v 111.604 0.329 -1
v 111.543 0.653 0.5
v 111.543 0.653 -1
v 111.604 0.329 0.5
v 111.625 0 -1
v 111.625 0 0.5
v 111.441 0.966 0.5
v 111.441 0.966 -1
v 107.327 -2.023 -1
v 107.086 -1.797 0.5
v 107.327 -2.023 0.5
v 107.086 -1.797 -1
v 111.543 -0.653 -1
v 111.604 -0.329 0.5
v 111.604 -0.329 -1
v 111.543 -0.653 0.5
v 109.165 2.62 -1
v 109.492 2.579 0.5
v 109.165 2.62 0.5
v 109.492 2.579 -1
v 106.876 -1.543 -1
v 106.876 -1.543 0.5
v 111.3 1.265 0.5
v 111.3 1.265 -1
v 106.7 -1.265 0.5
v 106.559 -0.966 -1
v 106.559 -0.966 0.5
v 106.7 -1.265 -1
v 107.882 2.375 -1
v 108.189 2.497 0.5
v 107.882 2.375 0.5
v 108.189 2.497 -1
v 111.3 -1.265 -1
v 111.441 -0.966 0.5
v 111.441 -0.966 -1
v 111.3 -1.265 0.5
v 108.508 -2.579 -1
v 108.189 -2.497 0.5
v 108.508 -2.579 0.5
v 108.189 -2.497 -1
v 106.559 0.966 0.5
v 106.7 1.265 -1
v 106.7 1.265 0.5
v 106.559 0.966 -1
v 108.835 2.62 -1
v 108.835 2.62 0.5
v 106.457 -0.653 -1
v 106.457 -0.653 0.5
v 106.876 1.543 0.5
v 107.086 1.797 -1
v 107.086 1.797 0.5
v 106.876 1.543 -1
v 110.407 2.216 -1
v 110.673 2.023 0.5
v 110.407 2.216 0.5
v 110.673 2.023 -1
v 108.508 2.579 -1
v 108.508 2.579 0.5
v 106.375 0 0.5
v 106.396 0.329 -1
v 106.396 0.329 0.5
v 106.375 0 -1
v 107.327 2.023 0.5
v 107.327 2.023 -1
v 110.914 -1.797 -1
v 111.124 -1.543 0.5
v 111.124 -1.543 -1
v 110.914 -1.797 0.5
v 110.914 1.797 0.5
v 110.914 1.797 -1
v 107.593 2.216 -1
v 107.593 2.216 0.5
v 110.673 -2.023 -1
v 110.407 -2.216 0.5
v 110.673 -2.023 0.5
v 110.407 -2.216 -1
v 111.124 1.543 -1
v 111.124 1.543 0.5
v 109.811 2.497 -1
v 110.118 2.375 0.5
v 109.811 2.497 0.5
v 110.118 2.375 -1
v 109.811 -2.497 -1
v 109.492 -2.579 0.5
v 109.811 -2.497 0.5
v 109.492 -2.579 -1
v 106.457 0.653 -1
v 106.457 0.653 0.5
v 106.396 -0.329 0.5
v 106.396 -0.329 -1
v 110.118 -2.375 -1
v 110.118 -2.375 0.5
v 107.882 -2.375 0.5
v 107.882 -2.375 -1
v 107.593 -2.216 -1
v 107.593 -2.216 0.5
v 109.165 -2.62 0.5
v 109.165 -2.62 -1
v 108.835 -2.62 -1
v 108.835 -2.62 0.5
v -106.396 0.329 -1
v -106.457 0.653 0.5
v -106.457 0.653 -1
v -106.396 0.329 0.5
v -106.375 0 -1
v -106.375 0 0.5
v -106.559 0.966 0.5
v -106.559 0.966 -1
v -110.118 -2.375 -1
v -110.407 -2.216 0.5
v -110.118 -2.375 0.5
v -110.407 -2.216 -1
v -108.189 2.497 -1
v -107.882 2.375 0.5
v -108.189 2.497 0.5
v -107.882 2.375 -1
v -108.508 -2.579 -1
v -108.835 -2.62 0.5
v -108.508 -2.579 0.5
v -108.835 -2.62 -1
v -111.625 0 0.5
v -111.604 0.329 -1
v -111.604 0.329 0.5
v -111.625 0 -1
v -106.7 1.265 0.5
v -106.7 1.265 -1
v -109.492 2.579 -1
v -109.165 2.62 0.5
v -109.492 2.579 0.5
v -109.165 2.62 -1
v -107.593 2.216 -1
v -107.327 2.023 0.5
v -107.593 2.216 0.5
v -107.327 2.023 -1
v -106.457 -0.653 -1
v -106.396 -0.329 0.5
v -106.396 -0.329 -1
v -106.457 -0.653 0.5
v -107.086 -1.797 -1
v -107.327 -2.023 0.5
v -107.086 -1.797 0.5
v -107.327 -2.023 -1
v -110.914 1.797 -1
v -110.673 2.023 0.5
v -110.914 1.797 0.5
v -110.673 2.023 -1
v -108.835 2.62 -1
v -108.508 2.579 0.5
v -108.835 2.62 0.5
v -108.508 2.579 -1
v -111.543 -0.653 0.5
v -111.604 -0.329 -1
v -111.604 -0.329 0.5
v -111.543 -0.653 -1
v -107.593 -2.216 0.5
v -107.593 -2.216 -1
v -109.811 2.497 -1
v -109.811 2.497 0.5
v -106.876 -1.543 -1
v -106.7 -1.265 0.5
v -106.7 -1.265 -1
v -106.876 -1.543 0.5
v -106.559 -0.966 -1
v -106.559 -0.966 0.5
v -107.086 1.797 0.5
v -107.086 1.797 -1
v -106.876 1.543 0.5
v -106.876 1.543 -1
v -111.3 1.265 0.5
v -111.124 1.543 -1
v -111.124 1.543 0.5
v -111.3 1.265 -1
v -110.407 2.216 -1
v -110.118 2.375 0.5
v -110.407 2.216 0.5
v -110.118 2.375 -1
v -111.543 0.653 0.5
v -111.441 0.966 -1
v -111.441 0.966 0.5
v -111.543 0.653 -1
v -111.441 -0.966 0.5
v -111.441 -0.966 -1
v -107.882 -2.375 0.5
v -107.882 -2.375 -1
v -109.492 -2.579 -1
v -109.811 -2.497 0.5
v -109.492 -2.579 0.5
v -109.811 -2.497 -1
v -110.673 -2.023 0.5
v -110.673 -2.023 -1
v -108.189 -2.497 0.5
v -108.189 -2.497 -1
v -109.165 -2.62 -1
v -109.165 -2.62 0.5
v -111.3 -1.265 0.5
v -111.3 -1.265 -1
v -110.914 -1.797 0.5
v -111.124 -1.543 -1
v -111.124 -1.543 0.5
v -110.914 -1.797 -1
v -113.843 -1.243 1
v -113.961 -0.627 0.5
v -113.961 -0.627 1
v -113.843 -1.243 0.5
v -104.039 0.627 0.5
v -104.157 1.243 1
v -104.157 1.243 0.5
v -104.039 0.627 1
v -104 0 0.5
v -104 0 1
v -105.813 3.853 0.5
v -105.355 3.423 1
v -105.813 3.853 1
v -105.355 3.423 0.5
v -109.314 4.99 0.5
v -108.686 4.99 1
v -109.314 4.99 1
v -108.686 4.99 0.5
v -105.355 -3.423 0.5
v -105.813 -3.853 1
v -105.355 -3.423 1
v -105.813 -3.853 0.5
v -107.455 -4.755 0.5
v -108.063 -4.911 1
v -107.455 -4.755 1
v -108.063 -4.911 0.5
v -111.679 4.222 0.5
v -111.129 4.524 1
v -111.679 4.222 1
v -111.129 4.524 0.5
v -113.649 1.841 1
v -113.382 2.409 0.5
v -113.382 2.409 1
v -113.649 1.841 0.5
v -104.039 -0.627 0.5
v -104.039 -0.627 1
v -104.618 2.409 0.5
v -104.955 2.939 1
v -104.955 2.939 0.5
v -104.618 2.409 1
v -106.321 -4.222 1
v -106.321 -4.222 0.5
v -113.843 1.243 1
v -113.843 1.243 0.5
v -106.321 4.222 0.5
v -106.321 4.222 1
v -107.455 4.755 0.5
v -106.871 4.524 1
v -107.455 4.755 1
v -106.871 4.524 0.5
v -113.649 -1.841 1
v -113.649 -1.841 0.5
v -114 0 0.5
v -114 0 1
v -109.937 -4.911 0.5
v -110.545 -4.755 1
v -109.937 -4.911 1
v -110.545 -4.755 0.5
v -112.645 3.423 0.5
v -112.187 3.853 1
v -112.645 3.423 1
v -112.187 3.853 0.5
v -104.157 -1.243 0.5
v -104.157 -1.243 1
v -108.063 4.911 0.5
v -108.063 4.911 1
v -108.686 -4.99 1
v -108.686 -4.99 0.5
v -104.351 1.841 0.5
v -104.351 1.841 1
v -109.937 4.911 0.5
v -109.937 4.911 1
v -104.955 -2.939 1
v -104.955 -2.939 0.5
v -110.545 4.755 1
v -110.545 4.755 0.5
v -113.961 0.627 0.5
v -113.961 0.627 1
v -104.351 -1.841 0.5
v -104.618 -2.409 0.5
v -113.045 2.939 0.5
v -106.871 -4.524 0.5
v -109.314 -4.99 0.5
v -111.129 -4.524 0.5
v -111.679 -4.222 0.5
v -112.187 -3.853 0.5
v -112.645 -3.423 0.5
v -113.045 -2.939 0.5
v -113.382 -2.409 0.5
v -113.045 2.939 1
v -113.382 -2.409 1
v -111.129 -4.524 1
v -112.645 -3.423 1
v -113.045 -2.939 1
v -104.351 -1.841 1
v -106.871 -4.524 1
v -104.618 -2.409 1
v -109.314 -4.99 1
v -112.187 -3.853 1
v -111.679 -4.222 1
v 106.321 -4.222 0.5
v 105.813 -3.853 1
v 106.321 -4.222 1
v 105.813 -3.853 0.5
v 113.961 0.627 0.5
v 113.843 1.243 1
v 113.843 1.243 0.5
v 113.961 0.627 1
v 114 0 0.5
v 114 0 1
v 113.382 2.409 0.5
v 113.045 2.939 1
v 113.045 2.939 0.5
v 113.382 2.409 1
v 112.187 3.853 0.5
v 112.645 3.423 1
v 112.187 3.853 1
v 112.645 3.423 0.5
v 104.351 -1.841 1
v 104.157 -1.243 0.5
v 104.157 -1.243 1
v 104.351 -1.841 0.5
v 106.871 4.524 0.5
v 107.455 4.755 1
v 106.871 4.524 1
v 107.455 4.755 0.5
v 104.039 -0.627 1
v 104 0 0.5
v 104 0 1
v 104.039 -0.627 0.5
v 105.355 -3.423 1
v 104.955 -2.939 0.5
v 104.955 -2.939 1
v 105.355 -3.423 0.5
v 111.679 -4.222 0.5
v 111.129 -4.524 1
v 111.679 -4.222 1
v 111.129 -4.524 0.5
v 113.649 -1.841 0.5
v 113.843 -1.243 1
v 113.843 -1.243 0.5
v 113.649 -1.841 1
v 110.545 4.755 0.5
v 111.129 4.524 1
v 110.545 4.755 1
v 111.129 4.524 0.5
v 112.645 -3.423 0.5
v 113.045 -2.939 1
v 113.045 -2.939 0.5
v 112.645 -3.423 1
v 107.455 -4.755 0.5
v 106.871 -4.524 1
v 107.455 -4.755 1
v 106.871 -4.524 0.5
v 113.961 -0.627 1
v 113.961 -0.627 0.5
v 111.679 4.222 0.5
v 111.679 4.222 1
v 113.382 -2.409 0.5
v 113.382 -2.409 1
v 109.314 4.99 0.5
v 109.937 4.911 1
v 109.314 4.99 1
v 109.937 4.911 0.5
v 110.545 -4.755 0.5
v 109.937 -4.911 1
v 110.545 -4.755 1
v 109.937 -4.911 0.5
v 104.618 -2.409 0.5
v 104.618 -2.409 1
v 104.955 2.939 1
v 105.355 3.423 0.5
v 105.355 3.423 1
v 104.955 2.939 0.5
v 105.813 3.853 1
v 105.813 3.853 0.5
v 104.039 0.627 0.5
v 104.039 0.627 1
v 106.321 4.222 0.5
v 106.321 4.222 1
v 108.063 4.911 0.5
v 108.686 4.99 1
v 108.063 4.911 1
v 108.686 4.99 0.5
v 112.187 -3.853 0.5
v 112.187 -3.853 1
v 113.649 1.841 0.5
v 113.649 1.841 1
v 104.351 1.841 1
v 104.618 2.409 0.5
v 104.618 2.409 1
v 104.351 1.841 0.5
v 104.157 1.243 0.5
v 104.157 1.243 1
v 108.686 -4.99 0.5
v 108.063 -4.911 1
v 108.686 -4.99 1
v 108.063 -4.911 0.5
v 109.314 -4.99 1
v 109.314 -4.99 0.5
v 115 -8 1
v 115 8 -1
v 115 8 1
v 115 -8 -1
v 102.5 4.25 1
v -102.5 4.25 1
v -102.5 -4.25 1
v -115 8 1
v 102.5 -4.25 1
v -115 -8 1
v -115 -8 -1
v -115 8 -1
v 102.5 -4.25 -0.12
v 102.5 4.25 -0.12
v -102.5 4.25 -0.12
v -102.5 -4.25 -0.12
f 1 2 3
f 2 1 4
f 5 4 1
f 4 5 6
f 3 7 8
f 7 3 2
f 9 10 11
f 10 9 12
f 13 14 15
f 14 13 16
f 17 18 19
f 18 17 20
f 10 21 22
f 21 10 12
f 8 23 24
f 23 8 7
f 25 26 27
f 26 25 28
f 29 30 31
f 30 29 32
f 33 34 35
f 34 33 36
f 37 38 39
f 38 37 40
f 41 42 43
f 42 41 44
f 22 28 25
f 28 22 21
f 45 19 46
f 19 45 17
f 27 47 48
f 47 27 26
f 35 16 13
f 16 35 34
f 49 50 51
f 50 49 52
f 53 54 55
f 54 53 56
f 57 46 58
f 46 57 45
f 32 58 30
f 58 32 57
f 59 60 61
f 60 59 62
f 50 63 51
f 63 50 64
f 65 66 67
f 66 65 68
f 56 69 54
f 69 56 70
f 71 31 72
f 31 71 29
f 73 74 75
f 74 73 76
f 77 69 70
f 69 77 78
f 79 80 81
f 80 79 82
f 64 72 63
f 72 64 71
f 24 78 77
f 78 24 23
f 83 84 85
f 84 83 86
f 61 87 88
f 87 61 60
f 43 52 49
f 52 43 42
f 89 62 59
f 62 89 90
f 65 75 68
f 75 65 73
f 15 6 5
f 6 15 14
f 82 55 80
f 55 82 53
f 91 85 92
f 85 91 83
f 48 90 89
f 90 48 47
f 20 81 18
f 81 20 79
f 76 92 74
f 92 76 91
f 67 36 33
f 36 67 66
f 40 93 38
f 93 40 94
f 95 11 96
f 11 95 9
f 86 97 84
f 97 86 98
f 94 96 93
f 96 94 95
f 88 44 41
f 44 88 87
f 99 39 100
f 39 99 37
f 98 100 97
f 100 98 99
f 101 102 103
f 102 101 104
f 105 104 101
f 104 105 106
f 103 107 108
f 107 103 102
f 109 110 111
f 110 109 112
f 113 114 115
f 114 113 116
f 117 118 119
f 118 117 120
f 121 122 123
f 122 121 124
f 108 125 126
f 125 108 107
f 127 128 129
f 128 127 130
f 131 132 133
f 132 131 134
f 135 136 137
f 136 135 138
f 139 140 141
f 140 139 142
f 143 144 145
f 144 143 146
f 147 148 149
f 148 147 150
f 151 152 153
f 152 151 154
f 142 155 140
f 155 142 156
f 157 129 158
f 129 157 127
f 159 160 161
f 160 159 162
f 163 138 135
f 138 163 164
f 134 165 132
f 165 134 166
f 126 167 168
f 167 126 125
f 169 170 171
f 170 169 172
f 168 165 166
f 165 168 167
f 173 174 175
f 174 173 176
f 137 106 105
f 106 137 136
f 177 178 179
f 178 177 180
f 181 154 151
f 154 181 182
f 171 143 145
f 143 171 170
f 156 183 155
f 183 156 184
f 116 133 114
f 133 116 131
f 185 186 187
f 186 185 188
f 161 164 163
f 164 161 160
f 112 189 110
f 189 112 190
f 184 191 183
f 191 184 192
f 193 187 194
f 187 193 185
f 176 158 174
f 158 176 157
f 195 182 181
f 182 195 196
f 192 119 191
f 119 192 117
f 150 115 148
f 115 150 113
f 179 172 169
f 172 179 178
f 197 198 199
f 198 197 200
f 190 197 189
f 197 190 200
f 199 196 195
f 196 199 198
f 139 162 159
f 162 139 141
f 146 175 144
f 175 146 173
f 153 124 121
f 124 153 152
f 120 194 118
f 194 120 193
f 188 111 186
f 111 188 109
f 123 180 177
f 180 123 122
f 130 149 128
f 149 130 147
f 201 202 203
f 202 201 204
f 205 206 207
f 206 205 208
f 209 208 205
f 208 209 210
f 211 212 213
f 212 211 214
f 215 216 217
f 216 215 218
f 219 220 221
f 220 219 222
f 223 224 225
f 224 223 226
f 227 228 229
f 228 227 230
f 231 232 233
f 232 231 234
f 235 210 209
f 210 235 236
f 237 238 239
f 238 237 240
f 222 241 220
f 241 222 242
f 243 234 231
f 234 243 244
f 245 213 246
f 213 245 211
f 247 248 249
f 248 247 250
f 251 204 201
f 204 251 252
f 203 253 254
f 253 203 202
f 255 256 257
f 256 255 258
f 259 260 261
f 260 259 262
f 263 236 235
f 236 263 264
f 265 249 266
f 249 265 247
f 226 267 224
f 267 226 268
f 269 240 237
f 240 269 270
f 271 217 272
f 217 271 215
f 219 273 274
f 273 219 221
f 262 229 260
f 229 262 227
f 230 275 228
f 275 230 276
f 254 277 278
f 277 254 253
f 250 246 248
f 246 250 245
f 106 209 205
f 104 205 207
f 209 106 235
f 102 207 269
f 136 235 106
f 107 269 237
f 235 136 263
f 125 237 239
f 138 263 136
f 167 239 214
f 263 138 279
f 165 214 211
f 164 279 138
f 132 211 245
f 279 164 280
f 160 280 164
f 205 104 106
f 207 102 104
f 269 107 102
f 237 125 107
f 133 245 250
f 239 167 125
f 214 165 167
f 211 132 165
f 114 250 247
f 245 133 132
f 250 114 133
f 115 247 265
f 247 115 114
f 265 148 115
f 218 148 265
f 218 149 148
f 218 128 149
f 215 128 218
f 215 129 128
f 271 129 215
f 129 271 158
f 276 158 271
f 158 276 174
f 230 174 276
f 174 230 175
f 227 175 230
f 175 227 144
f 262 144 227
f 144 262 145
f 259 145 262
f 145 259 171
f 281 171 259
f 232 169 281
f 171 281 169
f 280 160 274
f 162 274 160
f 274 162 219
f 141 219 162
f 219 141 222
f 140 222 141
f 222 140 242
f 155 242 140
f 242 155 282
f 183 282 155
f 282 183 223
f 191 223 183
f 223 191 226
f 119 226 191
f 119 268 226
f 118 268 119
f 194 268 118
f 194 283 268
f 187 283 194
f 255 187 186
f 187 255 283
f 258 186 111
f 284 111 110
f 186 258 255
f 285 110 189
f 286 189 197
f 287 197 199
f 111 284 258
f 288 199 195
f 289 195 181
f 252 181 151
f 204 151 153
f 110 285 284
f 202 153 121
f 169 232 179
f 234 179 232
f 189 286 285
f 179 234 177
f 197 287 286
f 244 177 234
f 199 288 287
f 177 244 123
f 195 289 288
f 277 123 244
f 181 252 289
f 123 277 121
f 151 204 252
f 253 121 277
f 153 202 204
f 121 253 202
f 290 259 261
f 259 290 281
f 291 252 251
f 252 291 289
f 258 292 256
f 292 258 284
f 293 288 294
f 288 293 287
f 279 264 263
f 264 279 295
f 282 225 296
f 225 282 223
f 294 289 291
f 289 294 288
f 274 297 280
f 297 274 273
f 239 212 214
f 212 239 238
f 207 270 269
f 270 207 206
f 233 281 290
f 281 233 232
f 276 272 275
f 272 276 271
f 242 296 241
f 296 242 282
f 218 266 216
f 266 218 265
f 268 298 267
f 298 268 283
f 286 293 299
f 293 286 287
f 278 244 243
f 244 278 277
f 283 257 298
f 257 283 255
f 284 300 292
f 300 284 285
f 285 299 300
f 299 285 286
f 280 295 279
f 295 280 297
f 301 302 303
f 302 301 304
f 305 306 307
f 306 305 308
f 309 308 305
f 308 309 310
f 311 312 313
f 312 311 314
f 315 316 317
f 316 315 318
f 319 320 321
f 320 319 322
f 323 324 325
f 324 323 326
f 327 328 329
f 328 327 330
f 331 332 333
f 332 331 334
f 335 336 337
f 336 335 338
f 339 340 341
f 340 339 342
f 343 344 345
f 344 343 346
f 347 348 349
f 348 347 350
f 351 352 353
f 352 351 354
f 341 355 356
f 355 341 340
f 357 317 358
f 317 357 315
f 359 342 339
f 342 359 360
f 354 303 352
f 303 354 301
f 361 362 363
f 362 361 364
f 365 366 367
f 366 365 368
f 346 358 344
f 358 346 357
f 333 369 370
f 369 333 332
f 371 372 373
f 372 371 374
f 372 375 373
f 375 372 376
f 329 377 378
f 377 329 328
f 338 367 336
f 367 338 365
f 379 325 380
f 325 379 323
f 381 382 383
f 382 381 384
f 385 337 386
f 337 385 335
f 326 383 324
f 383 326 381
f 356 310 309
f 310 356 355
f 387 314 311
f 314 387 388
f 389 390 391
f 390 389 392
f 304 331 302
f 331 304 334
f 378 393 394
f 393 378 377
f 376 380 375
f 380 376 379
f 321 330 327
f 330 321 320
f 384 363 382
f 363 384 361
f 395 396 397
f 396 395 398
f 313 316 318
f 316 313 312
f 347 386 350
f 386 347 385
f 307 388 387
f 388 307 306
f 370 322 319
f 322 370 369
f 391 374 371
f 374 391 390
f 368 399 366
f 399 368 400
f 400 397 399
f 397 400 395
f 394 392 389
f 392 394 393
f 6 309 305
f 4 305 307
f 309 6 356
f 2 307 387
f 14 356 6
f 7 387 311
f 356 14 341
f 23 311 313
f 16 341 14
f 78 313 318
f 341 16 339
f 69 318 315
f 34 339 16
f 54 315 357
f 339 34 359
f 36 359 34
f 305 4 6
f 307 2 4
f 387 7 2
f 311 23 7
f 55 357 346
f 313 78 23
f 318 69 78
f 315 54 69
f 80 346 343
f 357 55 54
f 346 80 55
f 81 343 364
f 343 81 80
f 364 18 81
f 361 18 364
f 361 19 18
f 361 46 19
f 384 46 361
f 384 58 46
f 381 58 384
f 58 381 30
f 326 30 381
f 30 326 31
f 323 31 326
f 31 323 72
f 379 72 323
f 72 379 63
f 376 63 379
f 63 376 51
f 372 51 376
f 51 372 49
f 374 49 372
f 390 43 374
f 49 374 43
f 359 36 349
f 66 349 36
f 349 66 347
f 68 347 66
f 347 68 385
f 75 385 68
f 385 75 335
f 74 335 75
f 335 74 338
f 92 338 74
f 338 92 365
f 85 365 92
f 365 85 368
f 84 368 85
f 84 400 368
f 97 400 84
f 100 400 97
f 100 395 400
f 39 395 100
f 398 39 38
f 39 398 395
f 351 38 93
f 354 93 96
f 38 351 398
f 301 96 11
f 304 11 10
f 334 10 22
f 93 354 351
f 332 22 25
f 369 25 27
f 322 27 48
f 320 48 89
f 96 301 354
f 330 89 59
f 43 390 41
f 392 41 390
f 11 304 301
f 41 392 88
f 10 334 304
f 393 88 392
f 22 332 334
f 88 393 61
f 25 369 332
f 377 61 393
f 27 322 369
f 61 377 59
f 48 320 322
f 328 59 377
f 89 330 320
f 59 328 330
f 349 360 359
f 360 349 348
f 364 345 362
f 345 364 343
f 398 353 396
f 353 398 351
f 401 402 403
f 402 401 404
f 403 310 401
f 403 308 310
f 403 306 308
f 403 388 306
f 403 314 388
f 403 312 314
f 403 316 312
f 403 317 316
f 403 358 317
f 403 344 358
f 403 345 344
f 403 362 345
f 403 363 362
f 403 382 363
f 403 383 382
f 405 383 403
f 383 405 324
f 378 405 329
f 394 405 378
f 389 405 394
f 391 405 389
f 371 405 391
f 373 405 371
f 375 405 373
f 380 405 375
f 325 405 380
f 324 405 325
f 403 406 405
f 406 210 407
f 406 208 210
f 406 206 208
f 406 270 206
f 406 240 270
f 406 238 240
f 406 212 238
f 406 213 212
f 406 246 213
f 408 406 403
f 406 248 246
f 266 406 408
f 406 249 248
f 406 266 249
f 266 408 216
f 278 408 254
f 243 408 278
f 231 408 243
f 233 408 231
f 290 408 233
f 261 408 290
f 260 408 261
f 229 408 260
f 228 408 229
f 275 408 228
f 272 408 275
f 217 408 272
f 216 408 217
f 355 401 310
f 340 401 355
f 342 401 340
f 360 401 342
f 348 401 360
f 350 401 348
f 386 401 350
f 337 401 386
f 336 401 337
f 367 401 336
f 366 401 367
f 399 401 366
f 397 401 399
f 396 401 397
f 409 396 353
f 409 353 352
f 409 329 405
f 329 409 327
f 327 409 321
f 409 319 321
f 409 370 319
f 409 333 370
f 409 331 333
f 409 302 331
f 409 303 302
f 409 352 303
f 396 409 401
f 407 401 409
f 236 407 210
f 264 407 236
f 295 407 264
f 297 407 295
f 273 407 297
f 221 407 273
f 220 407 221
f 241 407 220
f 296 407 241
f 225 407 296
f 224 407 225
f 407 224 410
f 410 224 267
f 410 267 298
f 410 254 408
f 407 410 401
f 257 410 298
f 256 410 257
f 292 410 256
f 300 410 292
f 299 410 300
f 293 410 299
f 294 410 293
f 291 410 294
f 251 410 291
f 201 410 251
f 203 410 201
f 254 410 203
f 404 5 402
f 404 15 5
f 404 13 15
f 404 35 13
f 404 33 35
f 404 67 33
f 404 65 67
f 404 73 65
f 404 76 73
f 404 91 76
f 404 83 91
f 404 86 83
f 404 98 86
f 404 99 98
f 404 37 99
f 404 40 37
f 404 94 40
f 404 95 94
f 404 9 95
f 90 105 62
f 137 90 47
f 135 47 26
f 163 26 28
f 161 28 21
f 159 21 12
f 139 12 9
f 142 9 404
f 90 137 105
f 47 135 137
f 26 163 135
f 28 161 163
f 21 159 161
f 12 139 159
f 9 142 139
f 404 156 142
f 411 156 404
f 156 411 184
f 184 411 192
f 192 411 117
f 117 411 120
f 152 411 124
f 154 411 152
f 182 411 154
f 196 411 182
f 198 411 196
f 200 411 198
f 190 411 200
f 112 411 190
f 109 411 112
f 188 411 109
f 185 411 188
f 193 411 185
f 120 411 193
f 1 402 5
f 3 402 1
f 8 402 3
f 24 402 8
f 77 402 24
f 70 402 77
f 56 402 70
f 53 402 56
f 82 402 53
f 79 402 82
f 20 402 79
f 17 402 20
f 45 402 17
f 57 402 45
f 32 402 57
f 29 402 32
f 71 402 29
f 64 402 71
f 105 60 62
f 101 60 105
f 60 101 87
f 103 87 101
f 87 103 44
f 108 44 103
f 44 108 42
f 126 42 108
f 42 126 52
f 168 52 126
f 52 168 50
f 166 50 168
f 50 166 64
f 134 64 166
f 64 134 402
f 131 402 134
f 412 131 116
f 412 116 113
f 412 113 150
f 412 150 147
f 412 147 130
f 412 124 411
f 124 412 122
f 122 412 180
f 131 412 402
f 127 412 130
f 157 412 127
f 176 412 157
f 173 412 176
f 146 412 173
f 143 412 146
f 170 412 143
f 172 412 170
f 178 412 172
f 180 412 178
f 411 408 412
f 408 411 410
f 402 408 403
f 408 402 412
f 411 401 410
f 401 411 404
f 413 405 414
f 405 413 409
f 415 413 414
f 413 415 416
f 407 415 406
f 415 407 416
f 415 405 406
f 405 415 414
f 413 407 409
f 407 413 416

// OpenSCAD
//parametric lightbar for LED strips
// 2019 Troseph
// https://www.thingiverse.com/thing:3626559

$fn=50;
// LED specifics
ledl=205;
ledw=8.5;
ledh=2.24;
// baseplate specifics
bpw=16;
bph=2;
// screw specifics
//length of screw
screwh=9;
//diameter of screw
screwd=5.25;
//diameter of screwhead
screwhd=10;
//magic to make the baseplate the right length
bpl=ledl+(screwhd*2.5);

difference(){
  baseplate();
  translate([0,0,1])led();
  screwHoles();
}
module screwHoles(){
  translate([((bpl/2)-6),0,0])cylinder(h=screwh,d=screwd,center=true);
  translate([-((bpl/2)-6),0,0])cylinder(h=screwh,d=screwd,center=true);
  translate([-((bpl/2)-6),0,1])cylinder(h=1,d=screwhd,center=true);
  translate([((bpl/2)-6),0,1])cylinder(h=1,d=screwhd,center=true);
}
module baseplate(){
  cube([bpl,bpw,bph],true);
}
module led(){
  cube([ledl,ledw,ledh],true);
}
